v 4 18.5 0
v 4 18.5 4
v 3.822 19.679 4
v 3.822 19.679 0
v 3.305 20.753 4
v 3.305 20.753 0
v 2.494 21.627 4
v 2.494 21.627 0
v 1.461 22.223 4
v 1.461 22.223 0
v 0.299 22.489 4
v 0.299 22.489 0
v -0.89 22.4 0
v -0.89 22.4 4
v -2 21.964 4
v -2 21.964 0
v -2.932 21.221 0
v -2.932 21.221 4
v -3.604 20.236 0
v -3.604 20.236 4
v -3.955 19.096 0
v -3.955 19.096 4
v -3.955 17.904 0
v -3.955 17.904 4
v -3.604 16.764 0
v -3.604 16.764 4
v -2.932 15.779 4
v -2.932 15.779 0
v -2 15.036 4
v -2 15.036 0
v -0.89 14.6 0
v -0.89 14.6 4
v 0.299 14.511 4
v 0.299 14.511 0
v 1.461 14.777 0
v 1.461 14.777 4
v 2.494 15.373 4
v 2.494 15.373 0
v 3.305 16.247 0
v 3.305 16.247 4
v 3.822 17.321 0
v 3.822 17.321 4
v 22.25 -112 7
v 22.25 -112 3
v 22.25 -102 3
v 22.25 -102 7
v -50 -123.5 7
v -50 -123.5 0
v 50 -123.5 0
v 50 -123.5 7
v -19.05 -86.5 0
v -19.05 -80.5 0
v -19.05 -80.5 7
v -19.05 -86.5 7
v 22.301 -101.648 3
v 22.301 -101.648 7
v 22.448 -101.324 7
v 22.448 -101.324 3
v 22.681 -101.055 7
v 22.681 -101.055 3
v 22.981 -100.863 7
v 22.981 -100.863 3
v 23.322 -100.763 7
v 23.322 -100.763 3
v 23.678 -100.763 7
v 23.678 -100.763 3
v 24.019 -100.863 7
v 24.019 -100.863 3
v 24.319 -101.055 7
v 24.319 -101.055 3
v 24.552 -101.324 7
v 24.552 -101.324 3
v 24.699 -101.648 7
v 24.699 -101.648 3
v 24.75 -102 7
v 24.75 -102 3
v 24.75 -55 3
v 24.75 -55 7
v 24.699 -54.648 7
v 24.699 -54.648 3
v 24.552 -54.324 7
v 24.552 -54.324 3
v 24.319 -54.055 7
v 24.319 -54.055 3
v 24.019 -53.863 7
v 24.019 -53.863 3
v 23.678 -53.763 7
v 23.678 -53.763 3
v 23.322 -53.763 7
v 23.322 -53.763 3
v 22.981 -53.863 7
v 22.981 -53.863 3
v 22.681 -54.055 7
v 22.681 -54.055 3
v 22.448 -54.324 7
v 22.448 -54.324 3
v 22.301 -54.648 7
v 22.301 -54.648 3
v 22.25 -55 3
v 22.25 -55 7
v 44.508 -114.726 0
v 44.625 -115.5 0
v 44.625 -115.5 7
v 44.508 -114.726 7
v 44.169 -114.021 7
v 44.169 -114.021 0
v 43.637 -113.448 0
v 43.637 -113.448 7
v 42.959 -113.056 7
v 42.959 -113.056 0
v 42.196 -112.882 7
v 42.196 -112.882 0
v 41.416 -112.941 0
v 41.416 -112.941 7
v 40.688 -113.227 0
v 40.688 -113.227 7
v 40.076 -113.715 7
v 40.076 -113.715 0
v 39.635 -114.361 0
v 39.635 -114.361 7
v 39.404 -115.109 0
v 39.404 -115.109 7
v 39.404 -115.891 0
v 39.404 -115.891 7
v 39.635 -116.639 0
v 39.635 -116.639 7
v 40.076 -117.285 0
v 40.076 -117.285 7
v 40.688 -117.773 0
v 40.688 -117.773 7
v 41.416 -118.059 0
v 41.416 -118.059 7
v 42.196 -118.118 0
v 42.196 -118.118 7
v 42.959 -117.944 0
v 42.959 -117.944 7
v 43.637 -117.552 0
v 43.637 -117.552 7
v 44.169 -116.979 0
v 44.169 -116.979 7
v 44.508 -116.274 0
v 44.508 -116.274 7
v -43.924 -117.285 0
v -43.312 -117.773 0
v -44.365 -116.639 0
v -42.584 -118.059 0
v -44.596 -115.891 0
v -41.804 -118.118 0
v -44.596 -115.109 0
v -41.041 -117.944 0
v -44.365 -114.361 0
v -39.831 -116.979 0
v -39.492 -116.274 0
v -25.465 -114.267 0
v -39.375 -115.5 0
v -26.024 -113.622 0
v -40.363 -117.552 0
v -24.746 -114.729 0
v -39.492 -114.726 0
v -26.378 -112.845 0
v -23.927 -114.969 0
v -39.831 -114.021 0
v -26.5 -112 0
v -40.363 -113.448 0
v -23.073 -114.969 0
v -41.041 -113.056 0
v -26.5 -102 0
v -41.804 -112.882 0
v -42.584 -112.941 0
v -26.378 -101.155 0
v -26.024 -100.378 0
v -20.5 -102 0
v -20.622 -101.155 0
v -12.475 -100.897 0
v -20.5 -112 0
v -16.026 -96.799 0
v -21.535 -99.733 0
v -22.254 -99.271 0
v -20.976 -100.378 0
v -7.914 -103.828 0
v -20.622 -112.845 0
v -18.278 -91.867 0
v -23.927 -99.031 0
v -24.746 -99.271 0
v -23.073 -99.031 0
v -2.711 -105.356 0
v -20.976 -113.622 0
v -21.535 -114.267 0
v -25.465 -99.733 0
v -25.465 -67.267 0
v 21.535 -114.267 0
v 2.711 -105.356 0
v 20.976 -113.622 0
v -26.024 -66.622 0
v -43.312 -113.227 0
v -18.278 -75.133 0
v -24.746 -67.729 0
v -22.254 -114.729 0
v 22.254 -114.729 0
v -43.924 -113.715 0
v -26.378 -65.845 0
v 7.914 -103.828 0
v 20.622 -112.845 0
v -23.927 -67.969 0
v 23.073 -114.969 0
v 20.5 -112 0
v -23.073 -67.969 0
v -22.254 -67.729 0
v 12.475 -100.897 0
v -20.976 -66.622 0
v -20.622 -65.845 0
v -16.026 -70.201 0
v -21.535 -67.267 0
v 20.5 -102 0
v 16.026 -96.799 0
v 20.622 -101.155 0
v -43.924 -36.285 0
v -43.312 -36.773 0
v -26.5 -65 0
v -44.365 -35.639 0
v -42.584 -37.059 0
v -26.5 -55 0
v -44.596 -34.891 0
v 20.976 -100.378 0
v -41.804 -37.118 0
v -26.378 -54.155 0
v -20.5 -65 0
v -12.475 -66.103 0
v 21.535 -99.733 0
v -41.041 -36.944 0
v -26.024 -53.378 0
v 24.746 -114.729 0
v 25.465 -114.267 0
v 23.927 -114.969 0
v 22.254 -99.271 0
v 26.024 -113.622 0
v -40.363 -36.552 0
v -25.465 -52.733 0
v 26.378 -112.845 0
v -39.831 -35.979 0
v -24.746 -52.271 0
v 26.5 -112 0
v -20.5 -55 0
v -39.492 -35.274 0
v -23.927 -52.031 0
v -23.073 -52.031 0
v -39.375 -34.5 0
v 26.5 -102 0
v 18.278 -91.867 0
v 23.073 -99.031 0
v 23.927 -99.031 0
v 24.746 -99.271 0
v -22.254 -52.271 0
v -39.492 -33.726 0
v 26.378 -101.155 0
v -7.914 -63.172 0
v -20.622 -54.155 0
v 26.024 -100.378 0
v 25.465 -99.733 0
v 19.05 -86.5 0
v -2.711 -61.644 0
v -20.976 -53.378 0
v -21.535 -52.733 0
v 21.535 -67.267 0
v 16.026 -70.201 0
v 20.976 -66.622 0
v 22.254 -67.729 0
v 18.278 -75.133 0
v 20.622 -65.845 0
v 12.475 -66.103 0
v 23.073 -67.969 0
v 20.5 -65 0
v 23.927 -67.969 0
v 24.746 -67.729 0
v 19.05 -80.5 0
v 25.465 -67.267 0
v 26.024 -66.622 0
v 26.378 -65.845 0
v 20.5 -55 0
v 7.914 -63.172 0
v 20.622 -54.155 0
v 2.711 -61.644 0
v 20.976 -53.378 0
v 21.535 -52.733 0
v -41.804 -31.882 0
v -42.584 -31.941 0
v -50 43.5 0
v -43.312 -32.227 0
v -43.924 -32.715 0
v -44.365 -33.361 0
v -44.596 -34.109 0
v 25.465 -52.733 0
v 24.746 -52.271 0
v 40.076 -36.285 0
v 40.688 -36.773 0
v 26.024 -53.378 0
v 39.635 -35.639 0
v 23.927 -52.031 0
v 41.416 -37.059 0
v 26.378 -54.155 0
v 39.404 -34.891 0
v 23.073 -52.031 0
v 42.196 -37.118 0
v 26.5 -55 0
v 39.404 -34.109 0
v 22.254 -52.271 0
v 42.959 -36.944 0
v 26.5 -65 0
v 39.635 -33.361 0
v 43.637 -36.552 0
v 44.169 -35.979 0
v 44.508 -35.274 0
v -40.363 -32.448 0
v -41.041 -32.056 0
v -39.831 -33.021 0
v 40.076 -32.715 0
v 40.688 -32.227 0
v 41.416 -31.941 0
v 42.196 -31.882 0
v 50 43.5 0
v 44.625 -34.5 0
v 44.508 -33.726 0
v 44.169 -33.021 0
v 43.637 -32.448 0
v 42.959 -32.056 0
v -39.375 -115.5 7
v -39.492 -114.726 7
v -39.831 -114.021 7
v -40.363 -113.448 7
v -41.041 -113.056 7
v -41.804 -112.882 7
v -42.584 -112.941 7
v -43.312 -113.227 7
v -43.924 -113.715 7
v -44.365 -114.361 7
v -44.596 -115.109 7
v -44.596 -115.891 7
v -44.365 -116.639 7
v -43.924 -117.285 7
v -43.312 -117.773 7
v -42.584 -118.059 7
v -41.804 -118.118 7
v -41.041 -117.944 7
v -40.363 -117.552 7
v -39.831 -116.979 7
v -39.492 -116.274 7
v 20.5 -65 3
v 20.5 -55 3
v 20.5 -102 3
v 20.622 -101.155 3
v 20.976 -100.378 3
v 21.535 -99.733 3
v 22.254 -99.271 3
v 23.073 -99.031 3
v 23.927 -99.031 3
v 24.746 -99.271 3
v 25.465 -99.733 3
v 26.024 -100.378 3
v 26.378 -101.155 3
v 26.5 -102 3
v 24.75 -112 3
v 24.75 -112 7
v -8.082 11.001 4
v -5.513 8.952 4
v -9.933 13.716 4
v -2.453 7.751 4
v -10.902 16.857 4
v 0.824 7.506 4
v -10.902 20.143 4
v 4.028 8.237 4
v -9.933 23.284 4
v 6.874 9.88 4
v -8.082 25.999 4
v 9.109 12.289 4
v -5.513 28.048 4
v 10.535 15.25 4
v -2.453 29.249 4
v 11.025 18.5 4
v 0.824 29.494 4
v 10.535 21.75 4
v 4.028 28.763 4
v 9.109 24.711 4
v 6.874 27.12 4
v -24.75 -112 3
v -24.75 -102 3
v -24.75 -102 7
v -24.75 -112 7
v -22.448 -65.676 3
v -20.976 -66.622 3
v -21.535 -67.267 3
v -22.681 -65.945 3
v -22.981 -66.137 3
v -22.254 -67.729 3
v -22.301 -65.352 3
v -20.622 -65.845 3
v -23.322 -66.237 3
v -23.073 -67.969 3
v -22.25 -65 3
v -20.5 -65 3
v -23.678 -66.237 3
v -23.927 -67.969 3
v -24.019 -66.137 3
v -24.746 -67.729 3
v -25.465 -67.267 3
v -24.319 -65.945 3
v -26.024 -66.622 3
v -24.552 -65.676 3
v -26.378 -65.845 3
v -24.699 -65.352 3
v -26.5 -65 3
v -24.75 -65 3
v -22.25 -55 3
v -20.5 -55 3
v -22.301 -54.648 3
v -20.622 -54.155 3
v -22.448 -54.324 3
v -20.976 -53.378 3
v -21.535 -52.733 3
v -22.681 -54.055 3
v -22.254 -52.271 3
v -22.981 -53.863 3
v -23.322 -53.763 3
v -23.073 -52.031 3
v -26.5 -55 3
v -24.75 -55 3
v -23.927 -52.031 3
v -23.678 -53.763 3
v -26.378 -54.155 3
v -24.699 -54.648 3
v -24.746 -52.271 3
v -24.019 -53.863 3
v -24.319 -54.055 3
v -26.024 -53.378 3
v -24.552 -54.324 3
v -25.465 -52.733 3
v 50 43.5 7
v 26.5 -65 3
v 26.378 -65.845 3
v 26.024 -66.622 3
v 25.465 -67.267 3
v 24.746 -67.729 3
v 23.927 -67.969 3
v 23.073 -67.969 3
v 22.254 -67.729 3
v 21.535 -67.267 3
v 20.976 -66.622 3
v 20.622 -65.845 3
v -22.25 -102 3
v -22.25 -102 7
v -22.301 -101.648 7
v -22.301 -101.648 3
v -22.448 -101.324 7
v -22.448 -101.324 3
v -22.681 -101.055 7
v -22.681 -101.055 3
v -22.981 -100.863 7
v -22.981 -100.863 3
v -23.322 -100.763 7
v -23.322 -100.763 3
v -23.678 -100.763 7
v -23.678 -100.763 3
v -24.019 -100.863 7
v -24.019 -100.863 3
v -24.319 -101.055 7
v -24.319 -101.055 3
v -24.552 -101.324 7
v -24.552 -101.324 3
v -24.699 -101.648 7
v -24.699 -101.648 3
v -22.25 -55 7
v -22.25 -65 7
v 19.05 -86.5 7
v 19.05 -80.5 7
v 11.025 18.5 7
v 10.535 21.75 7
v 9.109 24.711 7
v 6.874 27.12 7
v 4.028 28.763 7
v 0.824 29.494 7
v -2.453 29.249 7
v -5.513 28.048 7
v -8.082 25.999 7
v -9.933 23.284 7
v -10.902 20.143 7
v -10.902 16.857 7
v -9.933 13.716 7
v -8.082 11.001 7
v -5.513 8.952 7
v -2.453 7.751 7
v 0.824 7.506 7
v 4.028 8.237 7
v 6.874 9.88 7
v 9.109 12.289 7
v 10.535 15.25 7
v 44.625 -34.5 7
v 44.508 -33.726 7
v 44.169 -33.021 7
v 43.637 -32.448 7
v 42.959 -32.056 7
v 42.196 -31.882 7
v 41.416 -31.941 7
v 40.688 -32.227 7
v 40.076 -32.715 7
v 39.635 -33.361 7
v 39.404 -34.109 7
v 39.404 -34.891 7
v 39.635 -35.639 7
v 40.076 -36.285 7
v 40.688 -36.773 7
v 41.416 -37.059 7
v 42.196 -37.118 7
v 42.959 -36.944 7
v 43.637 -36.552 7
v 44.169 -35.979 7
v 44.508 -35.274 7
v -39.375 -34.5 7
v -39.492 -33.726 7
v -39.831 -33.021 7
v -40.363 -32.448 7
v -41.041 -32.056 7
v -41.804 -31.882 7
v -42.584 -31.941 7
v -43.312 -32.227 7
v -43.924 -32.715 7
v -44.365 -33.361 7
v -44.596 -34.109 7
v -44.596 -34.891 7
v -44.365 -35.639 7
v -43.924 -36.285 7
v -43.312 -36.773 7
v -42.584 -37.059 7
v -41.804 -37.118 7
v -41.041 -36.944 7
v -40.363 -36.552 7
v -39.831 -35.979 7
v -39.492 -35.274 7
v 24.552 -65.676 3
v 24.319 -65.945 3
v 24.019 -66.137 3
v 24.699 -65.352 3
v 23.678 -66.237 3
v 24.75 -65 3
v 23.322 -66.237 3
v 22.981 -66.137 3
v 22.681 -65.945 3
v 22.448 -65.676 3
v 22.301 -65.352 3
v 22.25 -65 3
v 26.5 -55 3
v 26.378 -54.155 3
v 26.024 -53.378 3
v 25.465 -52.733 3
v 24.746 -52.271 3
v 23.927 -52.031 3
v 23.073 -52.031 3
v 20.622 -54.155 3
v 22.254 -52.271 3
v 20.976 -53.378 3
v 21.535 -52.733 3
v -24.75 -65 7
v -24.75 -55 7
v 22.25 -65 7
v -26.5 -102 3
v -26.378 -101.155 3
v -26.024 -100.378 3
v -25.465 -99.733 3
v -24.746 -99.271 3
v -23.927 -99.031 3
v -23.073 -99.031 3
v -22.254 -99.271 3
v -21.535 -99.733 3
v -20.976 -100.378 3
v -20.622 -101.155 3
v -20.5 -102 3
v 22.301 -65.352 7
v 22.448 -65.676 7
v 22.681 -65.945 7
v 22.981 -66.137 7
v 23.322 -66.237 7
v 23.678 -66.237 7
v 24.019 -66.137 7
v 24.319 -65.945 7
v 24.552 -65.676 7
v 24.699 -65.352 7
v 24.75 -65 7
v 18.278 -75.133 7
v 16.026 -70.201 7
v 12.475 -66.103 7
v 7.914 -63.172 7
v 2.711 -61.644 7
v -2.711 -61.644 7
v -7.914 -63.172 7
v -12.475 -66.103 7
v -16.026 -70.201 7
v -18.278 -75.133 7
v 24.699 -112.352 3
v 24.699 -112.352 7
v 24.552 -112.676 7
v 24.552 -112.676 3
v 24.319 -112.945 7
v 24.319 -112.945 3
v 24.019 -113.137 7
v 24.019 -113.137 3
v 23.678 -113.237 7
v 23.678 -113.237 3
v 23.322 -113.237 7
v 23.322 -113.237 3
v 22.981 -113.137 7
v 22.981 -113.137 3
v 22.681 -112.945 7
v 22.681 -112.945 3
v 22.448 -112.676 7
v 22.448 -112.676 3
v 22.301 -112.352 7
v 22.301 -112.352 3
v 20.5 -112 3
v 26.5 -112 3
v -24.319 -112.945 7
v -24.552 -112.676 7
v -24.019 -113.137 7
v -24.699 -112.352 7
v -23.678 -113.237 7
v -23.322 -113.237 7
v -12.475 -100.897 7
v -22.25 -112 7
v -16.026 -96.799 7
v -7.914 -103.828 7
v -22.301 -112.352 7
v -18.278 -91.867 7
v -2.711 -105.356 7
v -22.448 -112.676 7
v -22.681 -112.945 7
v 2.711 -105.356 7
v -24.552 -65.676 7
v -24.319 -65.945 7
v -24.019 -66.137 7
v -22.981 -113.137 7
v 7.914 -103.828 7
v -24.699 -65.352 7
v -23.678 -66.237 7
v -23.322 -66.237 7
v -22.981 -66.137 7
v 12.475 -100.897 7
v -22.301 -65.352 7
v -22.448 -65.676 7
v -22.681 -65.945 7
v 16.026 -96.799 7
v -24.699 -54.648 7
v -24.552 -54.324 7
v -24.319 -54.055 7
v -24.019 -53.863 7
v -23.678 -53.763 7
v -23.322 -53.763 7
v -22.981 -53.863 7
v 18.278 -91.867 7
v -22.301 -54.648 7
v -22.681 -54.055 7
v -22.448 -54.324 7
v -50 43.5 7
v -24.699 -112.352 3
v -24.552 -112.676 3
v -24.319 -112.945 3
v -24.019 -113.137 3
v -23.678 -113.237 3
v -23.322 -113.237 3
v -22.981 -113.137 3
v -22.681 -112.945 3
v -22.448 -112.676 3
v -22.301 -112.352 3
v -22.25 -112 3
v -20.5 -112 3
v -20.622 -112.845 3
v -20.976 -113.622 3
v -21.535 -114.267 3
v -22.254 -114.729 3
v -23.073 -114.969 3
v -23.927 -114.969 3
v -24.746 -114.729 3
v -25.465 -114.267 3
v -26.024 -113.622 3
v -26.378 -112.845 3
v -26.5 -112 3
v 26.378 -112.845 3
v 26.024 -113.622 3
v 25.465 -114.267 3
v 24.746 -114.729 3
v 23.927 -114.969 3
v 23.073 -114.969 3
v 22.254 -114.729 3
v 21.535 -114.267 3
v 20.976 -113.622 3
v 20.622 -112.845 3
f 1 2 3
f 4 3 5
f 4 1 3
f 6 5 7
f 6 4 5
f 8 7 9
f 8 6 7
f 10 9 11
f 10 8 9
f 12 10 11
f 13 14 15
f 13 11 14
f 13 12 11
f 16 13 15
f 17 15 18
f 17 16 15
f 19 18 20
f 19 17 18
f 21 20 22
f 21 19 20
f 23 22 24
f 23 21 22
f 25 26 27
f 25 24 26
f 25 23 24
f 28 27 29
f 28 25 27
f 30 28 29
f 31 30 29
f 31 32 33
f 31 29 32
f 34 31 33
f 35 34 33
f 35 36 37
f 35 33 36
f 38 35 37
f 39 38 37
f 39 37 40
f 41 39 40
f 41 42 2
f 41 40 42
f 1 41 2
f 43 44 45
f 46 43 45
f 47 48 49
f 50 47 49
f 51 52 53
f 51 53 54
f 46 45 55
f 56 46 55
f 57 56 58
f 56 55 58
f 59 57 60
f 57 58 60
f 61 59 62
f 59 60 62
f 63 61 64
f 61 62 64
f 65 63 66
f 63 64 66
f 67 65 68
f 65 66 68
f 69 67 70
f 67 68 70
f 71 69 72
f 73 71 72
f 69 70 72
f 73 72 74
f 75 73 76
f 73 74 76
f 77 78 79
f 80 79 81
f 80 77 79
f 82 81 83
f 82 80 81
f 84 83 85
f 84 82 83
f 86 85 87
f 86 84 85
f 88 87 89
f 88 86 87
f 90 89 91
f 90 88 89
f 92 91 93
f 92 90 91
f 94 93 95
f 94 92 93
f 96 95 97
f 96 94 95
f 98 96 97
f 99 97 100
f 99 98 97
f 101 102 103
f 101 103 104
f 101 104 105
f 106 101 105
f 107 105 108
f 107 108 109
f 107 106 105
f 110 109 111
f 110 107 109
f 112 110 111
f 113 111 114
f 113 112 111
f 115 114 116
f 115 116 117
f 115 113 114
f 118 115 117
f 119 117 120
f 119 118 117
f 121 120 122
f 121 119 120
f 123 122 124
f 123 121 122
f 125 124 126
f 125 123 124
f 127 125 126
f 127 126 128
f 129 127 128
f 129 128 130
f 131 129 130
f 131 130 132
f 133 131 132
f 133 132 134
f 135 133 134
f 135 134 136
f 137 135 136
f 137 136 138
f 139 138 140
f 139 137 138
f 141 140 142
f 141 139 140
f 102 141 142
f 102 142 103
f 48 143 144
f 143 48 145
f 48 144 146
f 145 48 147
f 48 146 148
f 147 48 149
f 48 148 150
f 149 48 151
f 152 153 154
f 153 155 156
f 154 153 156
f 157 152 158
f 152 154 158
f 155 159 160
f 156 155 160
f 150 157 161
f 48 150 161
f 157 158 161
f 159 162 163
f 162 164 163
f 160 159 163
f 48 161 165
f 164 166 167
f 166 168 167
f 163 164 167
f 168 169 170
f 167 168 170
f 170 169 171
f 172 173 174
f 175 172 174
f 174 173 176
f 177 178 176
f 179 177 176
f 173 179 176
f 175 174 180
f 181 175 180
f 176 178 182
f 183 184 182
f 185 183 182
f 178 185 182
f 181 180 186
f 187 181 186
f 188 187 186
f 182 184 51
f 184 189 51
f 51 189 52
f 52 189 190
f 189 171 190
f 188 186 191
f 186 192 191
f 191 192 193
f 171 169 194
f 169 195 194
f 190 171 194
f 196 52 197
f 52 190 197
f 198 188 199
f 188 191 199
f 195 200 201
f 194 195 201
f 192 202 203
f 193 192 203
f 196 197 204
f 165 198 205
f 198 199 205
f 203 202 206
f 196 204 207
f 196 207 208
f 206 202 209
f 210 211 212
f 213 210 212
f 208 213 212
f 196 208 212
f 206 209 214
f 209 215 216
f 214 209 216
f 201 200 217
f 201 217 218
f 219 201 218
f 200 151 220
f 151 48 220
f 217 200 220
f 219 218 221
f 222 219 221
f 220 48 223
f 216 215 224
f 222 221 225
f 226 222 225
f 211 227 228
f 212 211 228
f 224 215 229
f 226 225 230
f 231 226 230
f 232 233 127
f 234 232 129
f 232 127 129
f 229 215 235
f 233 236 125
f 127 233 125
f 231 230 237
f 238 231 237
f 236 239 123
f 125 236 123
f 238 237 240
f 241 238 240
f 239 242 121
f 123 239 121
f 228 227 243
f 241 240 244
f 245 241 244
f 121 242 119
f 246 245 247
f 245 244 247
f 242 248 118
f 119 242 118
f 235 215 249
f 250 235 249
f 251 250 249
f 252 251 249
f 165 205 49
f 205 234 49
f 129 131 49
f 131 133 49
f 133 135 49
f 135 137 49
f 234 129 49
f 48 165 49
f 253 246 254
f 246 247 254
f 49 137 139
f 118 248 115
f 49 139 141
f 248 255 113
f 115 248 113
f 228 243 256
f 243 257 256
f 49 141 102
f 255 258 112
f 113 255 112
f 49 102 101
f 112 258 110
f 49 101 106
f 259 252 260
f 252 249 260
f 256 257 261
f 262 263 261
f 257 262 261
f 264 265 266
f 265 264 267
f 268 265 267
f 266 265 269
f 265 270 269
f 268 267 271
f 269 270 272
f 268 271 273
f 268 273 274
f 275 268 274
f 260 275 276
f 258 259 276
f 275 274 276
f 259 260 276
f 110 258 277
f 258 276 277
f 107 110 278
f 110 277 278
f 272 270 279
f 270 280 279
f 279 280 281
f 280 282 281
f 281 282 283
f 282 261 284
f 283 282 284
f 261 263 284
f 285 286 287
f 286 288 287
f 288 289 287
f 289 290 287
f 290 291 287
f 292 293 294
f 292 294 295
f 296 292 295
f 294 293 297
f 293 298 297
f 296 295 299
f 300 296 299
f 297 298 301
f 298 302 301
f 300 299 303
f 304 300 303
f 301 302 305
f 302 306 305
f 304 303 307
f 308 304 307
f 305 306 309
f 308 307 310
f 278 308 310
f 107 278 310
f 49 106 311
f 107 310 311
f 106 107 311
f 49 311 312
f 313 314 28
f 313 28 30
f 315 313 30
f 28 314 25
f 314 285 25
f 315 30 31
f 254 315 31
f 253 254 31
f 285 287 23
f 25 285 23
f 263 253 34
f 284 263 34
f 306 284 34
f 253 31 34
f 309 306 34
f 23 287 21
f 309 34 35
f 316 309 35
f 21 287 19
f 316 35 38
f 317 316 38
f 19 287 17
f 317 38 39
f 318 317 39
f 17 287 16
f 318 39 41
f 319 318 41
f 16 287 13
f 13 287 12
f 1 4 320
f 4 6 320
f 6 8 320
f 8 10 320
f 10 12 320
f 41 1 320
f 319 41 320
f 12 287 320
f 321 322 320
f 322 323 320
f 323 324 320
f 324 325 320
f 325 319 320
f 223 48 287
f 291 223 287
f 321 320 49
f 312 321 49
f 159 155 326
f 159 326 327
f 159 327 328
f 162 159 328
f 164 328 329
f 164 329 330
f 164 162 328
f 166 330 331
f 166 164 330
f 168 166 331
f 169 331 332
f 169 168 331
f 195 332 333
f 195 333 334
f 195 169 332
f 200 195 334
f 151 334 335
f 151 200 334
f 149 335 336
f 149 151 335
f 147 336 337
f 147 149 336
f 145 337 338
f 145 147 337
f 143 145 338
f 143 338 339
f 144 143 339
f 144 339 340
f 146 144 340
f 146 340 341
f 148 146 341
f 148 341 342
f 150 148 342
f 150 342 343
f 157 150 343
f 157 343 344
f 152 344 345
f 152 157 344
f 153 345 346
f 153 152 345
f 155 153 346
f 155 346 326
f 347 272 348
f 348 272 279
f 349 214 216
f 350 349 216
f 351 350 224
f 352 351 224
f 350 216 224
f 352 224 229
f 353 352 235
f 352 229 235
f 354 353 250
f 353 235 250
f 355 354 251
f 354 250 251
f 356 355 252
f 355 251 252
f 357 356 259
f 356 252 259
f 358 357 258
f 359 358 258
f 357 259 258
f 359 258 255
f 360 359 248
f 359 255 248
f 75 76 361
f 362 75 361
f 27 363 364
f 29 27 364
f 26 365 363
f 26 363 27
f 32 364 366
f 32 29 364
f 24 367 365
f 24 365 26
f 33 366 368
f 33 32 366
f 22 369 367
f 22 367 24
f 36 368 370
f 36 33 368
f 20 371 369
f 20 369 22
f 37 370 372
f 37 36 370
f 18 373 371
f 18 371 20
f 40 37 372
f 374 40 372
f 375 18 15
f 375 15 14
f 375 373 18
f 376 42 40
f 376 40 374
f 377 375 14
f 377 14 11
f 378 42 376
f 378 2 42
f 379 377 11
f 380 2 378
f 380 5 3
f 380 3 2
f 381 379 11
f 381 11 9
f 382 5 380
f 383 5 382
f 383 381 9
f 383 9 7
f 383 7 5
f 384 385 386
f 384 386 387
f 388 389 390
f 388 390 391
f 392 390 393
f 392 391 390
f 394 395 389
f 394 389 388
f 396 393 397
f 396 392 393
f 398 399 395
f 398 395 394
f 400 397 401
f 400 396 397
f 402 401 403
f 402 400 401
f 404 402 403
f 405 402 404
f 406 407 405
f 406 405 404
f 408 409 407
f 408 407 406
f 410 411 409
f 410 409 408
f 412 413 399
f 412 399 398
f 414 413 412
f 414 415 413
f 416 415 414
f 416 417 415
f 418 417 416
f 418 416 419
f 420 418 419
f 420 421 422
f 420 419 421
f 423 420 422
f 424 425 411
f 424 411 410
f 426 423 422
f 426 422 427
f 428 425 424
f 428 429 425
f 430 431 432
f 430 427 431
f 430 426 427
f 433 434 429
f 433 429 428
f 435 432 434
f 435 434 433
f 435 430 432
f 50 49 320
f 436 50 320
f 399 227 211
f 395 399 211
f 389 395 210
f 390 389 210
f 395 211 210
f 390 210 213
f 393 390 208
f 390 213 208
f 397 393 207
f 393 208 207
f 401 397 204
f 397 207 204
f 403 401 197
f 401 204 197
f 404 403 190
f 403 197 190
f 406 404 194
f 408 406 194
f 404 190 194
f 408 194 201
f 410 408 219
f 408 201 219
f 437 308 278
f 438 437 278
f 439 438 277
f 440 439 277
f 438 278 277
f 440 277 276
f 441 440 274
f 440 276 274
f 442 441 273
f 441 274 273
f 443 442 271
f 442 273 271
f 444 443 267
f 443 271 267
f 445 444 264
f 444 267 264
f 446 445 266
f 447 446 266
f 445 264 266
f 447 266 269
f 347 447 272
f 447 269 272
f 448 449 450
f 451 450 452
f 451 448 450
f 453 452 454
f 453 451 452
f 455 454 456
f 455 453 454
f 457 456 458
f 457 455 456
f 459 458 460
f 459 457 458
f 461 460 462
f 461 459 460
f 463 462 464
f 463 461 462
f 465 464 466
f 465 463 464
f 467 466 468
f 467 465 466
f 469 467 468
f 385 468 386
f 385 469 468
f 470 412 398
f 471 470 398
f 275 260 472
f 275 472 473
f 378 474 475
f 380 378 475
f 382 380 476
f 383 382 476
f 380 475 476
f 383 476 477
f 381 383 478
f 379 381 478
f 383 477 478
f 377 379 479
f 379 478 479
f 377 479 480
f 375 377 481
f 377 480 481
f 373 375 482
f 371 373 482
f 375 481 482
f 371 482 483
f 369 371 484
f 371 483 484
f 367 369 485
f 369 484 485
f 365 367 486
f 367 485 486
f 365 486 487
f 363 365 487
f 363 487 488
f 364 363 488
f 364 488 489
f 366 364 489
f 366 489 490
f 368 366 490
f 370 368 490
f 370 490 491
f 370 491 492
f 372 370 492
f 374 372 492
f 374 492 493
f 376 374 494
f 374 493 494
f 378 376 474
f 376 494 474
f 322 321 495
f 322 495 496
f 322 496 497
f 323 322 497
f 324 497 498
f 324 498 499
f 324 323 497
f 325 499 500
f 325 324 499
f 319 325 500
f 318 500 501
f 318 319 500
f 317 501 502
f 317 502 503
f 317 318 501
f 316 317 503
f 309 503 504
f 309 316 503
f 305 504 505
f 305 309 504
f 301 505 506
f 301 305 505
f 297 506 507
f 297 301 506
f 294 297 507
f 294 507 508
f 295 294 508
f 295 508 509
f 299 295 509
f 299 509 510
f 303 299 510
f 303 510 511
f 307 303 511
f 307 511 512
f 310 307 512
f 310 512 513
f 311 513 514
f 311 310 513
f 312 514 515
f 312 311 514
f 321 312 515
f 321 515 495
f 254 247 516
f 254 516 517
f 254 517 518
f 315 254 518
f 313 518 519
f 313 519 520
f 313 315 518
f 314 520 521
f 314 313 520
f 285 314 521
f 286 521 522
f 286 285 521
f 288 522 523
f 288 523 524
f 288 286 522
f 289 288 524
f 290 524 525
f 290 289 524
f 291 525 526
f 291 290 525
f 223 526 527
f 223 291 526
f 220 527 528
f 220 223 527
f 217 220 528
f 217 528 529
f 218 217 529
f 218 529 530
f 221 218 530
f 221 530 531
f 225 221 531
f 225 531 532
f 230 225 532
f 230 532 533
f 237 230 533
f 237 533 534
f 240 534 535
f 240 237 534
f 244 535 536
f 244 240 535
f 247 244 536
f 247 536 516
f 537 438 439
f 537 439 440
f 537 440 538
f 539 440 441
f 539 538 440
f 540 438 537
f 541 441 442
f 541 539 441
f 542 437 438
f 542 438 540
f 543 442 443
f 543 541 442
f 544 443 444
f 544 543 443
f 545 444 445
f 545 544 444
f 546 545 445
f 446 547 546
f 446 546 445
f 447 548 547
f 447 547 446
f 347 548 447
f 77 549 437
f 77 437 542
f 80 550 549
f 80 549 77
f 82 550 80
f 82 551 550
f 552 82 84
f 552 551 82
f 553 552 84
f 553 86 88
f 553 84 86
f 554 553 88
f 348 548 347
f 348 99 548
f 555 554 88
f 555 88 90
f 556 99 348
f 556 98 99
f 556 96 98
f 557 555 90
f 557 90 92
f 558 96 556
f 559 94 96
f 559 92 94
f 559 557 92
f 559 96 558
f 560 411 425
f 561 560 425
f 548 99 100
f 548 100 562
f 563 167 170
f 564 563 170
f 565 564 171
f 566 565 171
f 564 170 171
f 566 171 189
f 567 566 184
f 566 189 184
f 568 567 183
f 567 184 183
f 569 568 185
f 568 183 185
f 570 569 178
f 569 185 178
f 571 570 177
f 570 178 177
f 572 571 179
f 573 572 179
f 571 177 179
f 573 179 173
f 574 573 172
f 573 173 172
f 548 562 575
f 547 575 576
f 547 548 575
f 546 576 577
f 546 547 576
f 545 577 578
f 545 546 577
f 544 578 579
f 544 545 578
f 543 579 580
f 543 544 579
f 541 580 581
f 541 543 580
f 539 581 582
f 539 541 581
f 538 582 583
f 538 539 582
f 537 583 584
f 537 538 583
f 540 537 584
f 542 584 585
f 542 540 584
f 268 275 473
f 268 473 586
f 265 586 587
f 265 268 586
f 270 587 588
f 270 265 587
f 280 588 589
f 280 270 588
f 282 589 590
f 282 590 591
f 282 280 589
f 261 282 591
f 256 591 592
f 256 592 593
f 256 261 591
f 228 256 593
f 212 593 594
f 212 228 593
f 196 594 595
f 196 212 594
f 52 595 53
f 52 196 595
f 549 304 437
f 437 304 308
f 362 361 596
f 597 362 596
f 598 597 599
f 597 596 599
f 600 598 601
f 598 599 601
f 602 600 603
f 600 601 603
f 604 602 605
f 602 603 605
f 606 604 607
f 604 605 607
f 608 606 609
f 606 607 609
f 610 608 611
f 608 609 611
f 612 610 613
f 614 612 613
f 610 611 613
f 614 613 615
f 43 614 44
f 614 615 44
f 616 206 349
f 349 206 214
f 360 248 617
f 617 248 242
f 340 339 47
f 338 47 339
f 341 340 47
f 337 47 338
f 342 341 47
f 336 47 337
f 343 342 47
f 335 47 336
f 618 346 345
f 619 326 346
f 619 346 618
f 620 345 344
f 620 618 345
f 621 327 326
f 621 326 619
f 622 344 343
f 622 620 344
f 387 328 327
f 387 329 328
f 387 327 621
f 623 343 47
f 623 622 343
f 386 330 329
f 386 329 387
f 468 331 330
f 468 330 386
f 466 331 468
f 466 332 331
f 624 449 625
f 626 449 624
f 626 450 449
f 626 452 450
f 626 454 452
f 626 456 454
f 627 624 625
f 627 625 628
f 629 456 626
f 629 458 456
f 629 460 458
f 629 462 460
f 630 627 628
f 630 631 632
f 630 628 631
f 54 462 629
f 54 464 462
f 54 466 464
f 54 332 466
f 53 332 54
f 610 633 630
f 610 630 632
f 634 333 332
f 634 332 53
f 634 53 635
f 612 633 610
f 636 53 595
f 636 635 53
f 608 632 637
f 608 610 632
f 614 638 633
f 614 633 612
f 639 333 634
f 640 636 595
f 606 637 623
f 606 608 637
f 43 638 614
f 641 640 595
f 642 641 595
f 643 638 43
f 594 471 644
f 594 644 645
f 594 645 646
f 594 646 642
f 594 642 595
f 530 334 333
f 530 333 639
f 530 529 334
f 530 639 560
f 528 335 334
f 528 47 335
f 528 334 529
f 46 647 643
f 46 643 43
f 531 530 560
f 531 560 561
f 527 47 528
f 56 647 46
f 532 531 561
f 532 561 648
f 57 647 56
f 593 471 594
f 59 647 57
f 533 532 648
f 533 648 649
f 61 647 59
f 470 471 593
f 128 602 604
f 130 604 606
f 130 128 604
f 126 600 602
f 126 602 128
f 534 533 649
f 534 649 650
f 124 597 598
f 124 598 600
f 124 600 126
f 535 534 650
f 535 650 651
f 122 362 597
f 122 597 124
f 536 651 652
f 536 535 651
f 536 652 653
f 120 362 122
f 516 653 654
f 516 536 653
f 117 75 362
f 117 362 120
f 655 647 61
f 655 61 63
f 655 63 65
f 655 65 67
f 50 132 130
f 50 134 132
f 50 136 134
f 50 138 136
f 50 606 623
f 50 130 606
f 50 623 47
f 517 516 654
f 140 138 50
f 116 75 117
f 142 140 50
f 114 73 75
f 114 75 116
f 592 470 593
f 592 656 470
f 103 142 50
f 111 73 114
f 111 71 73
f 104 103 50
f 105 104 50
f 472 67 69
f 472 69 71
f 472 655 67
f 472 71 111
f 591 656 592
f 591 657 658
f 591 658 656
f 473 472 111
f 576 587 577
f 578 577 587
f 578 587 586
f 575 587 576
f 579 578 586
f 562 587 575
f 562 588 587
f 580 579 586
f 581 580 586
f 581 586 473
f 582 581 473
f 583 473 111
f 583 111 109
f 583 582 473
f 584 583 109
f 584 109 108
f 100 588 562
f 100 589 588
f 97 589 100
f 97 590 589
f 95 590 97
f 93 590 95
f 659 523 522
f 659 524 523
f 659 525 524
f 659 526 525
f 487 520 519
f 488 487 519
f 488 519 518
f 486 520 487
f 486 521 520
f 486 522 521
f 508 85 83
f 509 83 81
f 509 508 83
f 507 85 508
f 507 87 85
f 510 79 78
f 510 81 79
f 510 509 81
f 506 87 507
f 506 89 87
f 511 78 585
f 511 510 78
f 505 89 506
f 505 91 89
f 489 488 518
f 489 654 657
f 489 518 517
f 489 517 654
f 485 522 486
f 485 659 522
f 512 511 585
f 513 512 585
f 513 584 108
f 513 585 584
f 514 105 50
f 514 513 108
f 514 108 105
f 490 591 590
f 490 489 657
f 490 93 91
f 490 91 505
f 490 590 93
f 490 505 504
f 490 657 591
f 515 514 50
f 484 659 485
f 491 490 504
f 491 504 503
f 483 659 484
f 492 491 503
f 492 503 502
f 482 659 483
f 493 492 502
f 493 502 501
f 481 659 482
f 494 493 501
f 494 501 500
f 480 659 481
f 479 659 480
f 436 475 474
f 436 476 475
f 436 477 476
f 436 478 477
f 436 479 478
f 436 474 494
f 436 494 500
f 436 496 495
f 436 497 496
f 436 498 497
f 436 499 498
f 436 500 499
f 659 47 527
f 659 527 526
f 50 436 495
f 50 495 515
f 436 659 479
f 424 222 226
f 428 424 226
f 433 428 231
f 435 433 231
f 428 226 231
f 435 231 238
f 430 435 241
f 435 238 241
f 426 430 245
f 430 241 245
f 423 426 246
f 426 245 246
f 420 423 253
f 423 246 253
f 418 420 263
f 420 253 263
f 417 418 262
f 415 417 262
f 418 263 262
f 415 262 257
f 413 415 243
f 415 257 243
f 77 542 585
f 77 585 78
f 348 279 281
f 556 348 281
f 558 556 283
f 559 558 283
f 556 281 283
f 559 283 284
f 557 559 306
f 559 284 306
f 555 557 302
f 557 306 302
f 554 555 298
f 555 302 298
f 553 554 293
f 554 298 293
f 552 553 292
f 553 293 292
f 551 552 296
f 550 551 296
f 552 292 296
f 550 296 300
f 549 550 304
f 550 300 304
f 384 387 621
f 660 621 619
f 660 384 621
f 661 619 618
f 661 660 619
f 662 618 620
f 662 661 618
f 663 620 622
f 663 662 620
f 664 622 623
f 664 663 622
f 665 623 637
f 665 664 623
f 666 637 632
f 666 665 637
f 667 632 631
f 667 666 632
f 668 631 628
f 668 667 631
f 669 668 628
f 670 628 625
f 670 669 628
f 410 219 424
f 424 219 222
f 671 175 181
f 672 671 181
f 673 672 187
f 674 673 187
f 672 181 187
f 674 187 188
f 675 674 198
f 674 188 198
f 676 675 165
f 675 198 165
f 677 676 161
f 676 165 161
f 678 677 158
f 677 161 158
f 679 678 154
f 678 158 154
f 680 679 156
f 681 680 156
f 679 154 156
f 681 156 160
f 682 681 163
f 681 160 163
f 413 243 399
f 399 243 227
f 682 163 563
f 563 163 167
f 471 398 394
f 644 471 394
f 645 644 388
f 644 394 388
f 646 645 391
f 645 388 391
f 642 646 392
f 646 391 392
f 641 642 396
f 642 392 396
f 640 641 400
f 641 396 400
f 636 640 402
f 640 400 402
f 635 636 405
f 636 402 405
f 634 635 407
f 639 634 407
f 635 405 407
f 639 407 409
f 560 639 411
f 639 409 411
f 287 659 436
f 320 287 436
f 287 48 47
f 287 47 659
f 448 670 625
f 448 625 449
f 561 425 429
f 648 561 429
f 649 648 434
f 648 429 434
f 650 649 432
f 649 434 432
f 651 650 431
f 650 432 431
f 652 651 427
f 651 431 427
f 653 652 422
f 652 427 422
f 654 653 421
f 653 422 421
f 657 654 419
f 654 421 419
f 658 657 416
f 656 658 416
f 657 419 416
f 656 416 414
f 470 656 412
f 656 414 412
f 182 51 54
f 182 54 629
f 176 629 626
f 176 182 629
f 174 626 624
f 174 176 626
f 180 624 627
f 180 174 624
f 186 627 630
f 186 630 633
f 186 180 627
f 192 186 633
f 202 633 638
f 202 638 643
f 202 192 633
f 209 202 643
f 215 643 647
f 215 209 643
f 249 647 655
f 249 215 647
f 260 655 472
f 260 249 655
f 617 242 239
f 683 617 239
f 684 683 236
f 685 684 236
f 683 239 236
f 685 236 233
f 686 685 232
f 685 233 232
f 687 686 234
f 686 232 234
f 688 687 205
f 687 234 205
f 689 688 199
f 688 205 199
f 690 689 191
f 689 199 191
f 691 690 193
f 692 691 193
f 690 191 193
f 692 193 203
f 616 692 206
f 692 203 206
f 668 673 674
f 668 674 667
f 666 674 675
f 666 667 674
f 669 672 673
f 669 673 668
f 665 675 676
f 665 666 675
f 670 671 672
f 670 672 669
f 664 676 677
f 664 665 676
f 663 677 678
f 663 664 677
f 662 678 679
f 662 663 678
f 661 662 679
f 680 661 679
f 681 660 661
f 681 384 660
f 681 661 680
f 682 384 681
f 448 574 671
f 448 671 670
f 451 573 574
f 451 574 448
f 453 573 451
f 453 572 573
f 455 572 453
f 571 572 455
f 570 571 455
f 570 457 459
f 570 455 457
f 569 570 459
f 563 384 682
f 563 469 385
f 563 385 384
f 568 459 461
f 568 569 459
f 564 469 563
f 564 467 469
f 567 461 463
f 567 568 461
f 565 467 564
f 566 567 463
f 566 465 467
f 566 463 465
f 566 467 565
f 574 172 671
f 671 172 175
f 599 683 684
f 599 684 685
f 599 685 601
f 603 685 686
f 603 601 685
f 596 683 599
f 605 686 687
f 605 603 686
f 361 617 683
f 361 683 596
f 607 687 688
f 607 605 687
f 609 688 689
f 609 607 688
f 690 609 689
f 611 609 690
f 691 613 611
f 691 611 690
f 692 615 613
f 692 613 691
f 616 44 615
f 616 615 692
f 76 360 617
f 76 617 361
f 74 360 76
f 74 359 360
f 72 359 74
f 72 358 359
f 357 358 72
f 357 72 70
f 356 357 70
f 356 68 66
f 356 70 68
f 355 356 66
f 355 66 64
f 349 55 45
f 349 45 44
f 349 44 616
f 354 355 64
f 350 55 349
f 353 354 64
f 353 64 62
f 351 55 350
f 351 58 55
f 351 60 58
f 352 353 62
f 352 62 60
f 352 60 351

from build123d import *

# Parameters (mm, degrees)
SKETCH1_W           = 100
SKETCH1_H           = 247
SKETCH1_R           = 2.625
SKETCH1_R_2         = 4
BOSS_EXTRUDE1_DEPTH = 7
SKETCH2_R           = 11.025
CUT_EXTRUDE1_DEPTH  = 3
CUT_EXTRUDE2_DEPTH  = 3
SKETCH4_W           = 100
SKETCH4_H           = 80
CUT_EXTRUDE3_DEPTH  = 134.421325132


with BuildPart() as part:
    # Sketch1 → Boss-Extrude1 (new body)
    with BuildSketch(Plane.XY):
        Rectangle(SKETCH1_W, SKETCH1_H)
        with Locations((-42, -34.5)):
            Circle(SKETCH1_R, mode=Mode.SUBTRACT)
        with Locations((42, -34.5)):
            Circle(SKETCH1_R, mode=Mode.SUBTRACT)
        with Locations((-42, -115.5)):
            Circle(SKETCH1_R, mode=Mode.SUBTRACT)
        with Locations((42, -115.5)):
            Circle(SKETCH1_R, mode=Mode.SUBTRACT)
        with Locations((0, 18.5)):
            Circle(SKETCH1_R_2, mode=Mode.SUBTRACT)
        with Locations((42, 115.5)):
            Circle(SKETCH1_R, mode=Mode.SUBTRACT)
        with Locations((-42, 115.5)):
            Circle(SKETCH1_R, mode=Mode.SUBTRACT)
        with BuildLine():
            Line((-19.05, -80.5), (-19.05, -86.5))
            ThreePointArc((-19.05, -86.5), (0, -105.55), (19.05, -86.5))
            Line((19.05, -86.5), (19.05, -80.5))
            ThreePointArc((19.05, -80.5), (0, -61.45), (-19.05, -80.5))
        make_face(mode=Mode.SUBTRACT)
        with BuildLine():
            Line((-22.25, -55), (-22.25, -65))
            ThreePointArc((-22.25, -65), (-23.5, -66.25), (-24.75, -65))
            Line((-24.75, -65), (-24.75, -55))
            ThreePointArc((-24.75, -55), (-23.5, -53.75), (-22.25, -55))
        make_face(mode=Mode.SUBTRACT)
        with BuildLine():
            Line((22.25, -55), (22.25, -65))
            ThreePointArc((22.25, -65), (23.5, -66.25), (24.75, -65))
            Line((24.75, -65), (24.75, -55))
            ThreePointArc((24.75, -55), (23.5, -53.75), (22.25, -55))
        make_face(mode=Mode.SUBTRACT)
        with BuildLine():
            Line((22.25, -112), (22.25, -102))
            ThreePointArc((22.25, -102), (23.5, -100.75), (24.75, -102))
            Line((24.75, -102), (24.75, -112))
            ThreePointArc((24.75, -112), (23.5, -113.25), (22.25, -112))
        make_face(mode=Mode.SUBTRACT)
        with BuildLine():
            Line((-22.25, -112), (-22.25, -102))
            ThreePointArc((-22.25, -102), (-23.5, -100.75), (-24.75, -102))
            Line((-24.75, -102), (-24.75, -112))
            ThreePointArc((-24.75, -112), (-23.5, -113.25), (-22.25, -112))
        make_face(mode=Mode.SUBTRACT)
    extrude(amount=BOSS_EXTRUDE1_DEPTH)

    # Sketch2 → Cut-Extrude1 (cut)
    with BuildSketch(Plane.XY.offset(7)):
        with Locations((0, 18.5)):
            Circle(SKETCH2_R)
    extrude(amount=-CUT_EXTRUDE1_DEPTH, mode=Mode.SUBTRACT)

    # Sketch3 → Cut-Extrude2 (cut)
    with BuildSketch(Plane.XY):
        with BuildLine():
            Line((-26.5, -65), (-26.5, -55))
            ThreePointArc((-26.5, -55), (-23.5, -52), (-20.5, -55))
            Line((-20.5, -55), (-20.5, -65))
            ThreePointArc((-20.5, -65), (-23.5, -68), (-26.5, -65))
        make_face()
        with BuildLine():
            Line((20.5, -65), (20.5, -55))
            ThreePointArc((20.5, -55), (23.5, -52), (26.5, -55))
            Line((26.5, -55), (26.5, -65))
            ThreePointArc((26.5, -65), (23.5, -68), (20.5, -65))
        make_face()
        with BuildLine():
            Line((-26.5, -112), (-26.5, -102))
            ThreePointArc((-26.5, -102), (-23.5, -99), (-20.5, -102))
            Line((-20.5, -102), (-20.5, -112))
            ThreePointArc((-20.5, -112), (-23.5, -115), (-26.5, -112))
        make_face()
        with BuildLine():
            Line((20.5, -112), (20.5, -102))
            ThreePointArc((20.5, -102), (23.5, -99), (26.5, -102))
            Line((26.5, -102), (26.5, -112))
            ThreePointArc((26.5, -112), (23.5, -115), (20.5, -112))
        make_face()
    extrude(amount=CUT_EXTRUDE2_DEPTH, mode=Mode.SUBTRACT)

    # Sketch4 → Cut-Extrude3 (cut, through all)
    with BuildSketch(Plane.XY.offset(7)):
        with Locations((0, 83.5)):
            Rectangle(SKETCH4_W, SKETCH4_H)
    extrude(amount=-CUT_EXTRUDE3_DEPTH, mode=Mode.SUBTRACT)


solid = part.part
